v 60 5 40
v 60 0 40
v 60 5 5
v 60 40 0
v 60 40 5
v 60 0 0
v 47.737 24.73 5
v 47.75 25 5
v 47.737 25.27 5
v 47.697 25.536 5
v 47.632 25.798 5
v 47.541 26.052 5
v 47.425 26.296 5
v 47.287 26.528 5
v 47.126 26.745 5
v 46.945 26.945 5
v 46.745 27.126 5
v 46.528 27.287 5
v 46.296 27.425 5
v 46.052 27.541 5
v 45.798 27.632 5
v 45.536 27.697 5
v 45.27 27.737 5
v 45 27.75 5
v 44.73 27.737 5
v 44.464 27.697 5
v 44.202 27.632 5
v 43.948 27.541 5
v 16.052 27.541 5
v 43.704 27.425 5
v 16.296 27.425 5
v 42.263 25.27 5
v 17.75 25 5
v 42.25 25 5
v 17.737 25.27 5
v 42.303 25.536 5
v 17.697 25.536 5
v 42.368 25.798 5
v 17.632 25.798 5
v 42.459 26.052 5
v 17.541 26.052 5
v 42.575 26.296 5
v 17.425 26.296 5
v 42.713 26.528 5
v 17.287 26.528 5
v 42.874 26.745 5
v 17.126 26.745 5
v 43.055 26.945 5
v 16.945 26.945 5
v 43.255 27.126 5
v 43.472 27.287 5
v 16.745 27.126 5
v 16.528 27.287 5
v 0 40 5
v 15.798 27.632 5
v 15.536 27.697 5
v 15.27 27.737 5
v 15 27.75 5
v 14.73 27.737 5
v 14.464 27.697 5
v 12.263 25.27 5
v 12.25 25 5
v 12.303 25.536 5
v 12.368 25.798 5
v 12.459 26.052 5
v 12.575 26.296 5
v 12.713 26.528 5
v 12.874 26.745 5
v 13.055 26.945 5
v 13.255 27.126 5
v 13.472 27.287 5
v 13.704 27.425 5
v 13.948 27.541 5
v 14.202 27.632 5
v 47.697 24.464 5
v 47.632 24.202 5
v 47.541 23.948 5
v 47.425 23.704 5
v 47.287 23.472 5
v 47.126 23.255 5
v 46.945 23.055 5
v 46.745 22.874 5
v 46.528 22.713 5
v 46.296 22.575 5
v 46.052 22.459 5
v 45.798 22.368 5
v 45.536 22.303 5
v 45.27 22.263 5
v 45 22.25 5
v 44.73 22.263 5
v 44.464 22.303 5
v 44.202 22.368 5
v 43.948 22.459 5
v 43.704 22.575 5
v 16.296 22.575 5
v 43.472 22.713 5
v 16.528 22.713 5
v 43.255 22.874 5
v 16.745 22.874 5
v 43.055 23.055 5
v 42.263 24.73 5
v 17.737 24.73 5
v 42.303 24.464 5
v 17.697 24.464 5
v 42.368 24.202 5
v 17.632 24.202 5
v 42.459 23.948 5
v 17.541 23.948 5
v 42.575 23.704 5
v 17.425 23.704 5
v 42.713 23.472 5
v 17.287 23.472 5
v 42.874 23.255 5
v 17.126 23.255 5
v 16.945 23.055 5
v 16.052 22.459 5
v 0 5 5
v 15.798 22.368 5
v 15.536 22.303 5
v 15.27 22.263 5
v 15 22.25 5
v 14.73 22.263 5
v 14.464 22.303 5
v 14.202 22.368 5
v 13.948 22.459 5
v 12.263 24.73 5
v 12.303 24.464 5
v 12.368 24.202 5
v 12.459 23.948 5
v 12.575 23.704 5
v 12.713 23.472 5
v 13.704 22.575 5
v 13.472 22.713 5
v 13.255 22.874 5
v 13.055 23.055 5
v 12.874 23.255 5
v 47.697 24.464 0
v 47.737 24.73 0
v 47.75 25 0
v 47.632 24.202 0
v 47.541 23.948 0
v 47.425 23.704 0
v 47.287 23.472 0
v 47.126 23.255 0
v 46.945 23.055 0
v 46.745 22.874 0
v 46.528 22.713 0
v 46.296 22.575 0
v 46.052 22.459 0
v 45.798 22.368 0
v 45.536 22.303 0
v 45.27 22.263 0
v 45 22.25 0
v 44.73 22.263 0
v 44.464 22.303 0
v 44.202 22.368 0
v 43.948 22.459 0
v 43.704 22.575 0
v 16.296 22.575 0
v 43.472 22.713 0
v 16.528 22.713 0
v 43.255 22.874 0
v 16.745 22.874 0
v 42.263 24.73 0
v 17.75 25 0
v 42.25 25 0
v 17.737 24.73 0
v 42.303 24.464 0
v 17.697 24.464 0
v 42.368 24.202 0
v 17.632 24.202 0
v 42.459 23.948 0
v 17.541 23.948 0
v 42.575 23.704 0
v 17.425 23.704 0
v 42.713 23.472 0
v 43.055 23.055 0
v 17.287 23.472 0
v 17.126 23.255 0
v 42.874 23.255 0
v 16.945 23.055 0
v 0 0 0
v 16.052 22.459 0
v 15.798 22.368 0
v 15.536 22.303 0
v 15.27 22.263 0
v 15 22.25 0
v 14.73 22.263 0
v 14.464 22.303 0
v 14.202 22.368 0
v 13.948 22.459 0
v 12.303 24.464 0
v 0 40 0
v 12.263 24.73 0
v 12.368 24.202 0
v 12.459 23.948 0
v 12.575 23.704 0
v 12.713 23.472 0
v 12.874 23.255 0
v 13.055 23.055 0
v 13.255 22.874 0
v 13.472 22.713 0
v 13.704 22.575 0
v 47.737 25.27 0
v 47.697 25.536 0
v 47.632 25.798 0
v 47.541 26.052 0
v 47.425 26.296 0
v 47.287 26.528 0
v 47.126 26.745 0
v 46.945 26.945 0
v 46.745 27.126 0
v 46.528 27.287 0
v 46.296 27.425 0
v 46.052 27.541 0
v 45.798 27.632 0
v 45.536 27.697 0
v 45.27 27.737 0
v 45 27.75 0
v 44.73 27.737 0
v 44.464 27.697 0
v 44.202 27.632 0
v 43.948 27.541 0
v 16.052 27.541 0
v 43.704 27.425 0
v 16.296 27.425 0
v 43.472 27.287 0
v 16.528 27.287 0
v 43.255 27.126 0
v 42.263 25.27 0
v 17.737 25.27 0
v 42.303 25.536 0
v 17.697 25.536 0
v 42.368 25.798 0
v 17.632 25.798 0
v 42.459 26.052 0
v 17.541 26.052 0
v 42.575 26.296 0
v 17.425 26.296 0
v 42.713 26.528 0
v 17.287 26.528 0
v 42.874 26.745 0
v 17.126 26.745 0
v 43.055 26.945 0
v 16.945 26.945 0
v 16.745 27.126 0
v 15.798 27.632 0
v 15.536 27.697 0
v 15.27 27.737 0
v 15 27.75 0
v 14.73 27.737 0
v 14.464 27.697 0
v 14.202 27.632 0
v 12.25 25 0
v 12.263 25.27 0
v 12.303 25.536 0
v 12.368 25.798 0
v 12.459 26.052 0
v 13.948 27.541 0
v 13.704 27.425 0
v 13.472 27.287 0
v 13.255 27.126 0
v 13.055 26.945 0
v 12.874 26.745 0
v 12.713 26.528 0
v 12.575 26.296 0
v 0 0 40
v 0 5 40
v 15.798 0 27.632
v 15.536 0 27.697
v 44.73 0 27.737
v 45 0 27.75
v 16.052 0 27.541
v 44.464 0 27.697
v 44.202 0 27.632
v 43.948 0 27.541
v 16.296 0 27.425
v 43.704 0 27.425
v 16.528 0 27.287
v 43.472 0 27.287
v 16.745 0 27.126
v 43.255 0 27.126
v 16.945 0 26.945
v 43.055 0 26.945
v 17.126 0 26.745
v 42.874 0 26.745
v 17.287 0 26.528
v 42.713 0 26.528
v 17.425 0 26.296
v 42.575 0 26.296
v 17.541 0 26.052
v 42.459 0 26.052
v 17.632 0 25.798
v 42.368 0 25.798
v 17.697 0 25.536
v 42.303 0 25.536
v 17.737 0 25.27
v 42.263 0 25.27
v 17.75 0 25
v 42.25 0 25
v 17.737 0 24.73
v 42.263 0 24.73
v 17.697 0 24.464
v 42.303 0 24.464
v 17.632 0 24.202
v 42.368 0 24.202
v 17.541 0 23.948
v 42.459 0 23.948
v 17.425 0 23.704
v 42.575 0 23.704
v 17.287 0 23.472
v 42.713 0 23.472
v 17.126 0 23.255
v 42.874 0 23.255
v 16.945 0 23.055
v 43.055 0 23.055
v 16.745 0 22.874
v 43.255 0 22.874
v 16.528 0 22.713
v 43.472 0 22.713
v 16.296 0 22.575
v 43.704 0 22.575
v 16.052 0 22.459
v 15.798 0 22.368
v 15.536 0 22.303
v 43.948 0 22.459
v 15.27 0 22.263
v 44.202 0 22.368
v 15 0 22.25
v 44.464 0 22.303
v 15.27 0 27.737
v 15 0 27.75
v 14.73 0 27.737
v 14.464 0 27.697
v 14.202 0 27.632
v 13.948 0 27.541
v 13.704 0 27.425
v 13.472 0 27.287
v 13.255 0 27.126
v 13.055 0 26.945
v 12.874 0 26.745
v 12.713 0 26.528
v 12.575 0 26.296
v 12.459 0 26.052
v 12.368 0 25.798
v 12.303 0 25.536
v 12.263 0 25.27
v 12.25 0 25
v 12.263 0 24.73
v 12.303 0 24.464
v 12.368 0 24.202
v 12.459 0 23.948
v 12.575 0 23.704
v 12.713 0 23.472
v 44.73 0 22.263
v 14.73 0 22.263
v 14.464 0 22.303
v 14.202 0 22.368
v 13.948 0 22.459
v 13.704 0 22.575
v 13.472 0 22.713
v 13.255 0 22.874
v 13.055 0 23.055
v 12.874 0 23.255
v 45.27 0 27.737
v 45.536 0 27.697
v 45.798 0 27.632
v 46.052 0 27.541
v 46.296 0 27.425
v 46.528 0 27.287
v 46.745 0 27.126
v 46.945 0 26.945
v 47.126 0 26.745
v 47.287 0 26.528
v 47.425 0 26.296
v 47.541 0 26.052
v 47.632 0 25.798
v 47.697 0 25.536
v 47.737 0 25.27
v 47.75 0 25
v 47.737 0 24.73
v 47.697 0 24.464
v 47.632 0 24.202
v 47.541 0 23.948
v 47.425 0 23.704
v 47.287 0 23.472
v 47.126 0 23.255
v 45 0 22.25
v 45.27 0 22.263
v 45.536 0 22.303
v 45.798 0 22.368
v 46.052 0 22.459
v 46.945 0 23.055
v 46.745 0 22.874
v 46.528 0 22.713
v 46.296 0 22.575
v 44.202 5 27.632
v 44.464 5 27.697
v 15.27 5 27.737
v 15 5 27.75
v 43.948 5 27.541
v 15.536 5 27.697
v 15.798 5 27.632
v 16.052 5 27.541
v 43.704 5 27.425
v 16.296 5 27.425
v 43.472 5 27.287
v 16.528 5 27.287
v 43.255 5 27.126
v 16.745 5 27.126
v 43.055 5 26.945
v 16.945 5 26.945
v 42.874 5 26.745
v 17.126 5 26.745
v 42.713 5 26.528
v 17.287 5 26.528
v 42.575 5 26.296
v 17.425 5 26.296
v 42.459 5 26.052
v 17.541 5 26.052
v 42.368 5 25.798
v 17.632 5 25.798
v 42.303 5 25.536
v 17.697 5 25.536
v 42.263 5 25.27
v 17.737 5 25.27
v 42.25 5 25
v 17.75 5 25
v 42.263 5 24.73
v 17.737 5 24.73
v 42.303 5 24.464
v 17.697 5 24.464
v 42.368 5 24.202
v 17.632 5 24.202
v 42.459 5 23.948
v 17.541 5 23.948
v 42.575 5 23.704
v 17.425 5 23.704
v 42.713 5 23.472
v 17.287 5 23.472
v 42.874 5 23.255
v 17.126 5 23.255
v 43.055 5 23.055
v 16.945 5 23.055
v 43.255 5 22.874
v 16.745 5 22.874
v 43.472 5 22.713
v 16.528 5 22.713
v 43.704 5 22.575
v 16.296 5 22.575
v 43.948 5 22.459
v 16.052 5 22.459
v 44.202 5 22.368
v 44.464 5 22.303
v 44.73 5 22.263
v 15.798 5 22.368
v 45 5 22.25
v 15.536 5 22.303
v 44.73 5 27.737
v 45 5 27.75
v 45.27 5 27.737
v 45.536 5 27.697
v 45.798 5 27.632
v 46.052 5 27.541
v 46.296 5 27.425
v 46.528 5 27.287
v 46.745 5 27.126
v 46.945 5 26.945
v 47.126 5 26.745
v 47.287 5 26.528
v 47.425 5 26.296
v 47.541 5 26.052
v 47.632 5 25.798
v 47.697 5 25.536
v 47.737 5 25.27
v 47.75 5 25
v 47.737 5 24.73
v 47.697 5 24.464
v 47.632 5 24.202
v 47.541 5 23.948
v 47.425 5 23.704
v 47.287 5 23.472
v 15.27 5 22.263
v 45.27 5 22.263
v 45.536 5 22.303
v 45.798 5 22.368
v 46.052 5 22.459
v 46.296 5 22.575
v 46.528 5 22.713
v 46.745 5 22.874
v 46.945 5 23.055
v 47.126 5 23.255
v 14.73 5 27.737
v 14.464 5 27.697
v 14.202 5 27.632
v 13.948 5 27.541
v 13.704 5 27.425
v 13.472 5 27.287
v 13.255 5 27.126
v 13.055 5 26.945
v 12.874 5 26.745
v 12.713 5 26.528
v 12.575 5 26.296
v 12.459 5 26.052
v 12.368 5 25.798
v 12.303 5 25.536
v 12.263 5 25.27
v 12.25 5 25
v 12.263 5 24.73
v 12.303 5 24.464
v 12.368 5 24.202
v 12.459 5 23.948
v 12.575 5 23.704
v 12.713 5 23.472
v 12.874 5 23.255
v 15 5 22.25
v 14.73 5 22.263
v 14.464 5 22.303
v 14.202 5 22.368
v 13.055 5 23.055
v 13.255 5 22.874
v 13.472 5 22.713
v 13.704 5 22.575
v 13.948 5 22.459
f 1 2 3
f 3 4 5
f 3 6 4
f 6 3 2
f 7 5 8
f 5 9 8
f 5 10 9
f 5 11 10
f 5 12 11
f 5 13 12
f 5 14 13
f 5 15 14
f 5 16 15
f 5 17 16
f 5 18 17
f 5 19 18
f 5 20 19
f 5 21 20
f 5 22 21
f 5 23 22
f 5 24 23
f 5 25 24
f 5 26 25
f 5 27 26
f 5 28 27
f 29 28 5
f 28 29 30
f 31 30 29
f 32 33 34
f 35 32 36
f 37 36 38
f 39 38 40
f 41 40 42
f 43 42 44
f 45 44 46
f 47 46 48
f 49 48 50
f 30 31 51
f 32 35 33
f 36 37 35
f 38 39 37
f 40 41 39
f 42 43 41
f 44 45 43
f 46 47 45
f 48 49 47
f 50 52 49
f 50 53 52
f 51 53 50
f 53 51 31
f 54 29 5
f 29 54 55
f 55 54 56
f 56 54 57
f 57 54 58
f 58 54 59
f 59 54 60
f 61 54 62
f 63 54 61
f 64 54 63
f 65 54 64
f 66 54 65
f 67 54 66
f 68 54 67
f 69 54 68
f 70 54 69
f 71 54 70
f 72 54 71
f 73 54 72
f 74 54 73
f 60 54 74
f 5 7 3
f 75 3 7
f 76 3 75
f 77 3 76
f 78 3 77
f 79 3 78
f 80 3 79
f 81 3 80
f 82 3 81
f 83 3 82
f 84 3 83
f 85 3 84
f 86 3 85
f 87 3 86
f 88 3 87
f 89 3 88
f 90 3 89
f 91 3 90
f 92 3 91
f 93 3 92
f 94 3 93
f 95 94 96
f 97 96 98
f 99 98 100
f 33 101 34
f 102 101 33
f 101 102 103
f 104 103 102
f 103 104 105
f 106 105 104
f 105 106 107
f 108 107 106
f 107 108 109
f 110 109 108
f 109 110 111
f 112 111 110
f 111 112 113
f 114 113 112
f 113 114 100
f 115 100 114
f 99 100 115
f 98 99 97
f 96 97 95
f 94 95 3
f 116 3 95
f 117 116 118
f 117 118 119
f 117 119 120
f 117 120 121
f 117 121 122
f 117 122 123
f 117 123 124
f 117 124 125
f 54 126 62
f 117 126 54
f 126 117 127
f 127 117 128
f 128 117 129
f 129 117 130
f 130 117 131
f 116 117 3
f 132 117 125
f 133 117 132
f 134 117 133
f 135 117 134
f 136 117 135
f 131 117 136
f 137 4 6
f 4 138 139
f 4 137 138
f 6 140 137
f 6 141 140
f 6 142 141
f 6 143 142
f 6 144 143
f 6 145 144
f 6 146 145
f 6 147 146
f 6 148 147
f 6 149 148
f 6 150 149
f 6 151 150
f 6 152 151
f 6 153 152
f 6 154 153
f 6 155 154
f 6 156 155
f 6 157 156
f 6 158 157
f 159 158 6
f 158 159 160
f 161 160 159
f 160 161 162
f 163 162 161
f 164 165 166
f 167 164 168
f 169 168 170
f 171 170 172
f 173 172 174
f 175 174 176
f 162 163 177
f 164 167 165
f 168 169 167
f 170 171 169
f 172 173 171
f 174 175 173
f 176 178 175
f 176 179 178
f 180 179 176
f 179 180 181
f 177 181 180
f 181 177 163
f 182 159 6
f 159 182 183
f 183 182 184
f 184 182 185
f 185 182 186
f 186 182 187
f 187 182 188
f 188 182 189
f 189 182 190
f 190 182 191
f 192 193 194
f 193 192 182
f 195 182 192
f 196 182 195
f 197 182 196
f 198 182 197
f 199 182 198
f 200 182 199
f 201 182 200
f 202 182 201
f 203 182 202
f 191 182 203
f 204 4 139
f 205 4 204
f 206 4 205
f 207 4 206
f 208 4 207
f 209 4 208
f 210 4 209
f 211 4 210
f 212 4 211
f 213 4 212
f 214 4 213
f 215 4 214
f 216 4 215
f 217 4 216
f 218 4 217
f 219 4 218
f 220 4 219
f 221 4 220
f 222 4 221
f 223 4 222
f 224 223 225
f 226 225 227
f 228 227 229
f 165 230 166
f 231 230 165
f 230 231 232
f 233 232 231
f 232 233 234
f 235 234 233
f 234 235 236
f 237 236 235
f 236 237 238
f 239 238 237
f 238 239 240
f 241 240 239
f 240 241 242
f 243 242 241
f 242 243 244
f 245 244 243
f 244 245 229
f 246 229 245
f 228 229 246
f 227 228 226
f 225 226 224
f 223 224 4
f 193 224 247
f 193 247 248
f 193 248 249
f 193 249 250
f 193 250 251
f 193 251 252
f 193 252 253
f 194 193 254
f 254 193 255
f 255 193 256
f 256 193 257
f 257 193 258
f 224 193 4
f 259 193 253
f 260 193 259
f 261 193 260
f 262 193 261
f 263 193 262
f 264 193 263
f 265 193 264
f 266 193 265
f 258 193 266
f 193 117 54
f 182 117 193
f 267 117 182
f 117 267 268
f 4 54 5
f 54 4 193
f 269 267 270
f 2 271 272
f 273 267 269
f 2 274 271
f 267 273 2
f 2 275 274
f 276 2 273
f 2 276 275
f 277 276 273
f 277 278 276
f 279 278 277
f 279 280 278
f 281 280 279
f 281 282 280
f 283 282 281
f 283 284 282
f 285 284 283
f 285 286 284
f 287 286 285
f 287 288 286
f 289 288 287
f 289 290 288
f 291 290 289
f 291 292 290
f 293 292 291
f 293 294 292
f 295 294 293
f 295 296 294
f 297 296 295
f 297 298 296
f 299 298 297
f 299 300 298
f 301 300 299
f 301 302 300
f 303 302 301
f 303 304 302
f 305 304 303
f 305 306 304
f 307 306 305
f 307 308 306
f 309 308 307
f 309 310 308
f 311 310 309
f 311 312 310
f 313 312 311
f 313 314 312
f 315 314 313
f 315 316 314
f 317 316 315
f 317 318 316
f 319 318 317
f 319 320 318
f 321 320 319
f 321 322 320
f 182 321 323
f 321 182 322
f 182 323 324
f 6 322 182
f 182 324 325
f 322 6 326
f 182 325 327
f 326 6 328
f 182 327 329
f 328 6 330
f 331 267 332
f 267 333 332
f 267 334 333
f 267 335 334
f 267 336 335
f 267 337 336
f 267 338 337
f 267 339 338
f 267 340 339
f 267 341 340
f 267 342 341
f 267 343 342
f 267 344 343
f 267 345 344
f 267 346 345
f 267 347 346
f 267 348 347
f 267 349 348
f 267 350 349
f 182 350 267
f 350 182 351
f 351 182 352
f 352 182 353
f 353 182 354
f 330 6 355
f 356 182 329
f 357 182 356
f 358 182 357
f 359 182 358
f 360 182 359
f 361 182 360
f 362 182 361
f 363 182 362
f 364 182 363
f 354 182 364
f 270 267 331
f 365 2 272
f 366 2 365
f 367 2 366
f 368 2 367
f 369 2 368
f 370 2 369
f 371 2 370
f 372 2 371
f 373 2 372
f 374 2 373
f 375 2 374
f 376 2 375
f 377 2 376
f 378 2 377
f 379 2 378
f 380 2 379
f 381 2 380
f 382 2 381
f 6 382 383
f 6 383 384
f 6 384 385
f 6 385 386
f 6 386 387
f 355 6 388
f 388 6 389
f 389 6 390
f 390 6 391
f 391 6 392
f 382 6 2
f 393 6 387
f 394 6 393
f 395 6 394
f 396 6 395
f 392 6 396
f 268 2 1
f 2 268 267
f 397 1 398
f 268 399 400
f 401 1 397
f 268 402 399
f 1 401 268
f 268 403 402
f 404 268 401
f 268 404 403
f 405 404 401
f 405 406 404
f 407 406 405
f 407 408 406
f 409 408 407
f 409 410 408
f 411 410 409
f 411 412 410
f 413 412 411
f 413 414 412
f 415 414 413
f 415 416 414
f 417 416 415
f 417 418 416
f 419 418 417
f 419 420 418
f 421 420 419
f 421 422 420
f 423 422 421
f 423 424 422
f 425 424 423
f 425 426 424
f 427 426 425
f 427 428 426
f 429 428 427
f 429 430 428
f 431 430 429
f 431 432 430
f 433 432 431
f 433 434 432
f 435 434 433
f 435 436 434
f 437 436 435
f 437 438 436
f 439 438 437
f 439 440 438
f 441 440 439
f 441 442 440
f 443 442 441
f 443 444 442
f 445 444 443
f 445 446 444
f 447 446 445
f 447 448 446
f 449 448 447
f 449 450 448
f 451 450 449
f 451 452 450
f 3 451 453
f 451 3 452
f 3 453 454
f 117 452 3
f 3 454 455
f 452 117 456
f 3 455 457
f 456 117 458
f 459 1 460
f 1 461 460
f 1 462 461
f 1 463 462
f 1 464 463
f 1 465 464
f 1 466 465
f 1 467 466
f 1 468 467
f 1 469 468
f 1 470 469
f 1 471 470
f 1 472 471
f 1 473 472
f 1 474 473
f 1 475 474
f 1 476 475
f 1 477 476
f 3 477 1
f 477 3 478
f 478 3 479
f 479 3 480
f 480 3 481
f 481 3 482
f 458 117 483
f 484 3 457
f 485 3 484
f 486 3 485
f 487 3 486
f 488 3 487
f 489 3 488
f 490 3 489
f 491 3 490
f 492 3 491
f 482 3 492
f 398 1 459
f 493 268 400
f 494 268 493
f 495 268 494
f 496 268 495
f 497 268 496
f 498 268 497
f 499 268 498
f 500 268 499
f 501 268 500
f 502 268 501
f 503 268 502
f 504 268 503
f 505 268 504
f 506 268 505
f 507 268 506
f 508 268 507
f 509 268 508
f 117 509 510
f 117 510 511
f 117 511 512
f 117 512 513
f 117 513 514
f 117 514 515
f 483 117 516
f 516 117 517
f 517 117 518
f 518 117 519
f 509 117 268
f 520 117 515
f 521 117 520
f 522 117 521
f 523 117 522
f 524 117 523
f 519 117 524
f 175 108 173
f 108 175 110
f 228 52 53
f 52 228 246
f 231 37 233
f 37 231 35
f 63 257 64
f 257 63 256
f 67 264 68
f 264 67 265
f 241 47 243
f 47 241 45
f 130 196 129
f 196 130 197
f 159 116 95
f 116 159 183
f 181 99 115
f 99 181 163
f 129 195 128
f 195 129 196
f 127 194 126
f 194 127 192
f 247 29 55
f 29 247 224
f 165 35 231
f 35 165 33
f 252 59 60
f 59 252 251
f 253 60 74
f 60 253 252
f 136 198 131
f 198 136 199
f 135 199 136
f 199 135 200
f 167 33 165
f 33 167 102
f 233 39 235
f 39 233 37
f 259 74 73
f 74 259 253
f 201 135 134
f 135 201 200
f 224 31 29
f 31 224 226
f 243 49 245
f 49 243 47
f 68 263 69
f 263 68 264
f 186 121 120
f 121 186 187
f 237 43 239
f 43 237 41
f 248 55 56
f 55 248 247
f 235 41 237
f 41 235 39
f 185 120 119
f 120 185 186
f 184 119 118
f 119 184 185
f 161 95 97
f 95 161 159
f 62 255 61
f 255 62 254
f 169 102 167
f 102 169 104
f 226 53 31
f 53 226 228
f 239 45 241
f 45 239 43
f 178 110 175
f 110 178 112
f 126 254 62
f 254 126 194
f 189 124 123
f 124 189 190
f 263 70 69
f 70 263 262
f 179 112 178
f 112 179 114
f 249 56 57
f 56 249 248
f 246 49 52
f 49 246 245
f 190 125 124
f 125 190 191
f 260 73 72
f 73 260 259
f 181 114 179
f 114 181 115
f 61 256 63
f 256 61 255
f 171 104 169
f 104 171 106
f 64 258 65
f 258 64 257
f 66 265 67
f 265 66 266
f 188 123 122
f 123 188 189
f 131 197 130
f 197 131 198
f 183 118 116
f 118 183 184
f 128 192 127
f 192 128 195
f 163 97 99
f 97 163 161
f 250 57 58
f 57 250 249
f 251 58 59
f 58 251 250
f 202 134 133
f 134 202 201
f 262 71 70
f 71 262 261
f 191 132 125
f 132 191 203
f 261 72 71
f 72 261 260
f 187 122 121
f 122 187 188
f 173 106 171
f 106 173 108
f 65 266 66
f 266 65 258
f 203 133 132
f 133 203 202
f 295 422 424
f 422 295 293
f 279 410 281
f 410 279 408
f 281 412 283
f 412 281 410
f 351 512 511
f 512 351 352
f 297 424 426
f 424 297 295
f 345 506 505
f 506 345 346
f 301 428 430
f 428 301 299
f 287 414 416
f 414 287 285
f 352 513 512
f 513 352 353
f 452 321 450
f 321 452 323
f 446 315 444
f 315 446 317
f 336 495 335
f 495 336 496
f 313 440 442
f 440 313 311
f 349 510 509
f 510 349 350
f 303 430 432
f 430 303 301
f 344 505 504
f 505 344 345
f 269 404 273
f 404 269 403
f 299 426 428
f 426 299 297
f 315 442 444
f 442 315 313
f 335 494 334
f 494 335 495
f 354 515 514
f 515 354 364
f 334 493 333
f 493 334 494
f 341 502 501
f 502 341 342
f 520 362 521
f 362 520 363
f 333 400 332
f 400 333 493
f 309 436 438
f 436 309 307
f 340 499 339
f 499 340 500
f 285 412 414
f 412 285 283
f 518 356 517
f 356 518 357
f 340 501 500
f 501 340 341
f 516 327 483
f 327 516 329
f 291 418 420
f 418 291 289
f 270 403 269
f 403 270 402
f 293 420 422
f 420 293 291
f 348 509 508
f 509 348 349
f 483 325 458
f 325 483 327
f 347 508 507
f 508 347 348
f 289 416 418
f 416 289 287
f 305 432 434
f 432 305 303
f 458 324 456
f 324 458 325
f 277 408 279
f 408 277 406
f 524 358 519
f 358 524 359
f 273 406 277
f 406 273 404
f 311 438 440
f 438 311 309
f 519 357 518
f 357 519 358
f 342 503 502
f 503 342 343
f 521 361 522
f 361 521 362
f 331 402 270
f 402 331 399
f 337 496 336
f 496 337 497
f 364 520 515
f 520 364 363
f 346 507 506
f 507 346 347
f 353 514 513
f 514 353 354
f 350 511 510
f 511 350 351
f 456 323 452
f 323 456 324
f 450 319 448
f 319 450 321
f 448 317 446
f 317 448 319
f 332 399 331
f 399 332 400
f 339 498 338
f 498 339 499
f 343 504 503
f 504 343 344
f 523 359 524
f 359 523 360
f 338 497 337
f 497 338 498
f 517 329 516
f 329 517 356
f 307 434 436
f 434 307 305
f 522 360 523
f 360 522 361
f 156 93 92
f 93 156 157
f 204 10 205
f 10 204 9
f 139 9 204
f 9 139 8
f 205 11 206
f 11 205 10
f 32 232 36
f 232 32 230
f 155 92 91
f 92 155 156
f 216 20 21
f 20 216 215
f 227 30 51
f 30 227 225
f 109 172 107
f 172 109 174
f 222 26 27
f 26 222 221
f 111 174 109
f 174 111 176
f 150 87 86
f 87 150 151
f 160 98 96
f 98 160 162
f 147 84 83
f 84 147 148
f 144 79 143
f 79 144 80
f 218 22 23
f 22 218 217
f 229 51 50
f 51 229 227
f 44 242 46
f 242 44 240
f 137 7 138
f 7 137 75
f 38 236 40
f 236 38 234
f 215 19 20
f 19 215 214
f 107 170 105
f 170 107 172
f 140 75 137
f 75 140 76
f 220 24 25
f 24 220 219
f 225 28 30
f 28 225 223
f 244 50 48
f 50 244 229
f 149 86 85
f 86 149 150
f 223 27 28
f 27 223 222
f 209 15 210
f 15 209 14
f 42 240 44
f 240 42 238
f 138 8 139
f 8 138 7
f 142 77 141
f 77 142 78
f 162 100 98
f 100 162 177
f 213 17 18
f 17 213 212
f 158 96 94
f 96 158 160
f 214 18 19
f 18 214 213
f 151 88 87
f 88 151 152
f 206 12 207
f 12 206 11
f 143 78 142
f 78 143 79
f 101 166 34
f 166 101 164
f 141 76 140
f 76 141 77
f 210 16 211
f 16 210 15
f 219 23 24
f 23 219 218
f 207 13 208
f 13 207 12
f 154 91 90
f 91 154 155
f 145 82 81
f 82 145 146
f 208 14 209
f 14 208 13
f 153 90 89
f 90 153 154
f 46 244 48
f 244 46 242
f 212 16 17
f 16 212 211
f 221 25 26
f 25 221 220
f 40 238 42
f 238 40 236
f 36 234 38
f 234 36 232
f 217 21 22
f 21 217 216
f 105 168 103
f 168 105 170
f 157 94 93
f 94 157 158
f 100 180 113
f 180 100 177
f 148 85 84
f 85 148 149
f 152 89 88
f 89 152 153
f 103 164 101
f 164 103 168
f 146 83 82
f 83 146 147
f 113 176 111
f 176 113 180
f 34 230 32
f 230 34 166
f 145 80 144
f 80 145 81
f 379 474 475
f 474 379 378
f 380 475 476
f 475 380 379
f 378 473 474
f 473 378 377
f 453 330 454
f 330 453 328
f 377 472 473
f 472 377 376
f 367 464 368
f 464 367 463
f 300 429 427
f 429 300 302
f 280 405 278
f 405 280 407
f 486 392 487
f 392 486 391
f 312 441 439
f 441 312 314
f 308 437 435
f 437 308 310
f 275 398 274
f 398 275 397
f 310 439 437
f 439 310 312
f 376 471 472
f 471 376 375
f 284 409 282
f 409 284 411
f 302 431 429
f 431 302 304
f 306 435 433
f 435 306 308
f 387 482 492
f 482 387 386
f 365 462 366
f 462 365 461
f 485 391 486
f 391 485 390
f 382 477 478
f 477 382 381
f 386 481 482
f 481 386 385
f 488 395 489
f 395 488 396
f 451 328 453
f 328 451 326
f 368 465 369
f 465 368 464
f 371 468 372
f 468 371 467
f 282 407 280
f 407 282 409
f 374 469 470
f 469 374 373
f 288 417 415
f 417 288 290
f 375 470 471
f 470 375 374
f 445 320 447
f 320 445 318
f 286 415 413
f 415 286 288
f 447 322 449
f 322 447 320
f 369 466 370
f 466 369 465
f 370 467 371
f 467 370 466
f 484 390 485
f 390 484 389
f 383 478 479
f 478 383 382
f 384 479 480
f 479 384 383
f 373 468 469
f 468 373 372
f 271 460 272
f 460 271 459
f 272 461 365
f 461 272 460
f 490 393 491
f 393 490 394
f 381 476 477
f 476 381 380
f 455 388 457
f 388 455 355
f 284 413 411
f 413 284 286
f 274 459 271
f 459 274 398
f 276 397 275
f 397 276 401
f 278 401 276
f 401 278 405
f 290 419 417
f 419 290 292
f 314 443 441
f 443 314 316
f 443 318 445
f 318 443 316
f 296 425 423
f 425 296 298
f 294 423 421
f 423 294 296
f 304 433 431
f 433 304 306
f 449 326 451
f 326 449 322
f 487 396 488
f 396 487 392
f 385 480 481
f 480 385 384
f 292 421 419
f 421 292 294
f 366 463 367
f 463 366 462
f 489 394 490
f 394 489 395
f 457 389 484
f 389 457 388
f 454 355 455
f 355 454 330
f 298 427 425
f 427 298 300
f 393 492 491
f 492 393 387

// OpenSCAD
// L-shaped mounting bracket with two holes per flange.
len_x = 60;
depth_y = 40;
height_z = 40;
wall = 5;
hole_d = 5.5;

module bracket() {
    difference() {
        union() {
            cube([len_x, depth_y, wall]);      // horizontal flange
            cube([len_x, wall, height_z]);     // vertical flange
        }
        for (x = [15, 45]) {
            translate([x, 25, -1])
                cylinder(h = wall + 2, d = hole_d, $fn = 64);
            translate([x, wall + 1, 25])
                rotate([90, 0, 0])
                    cylinder(h = wall + 2, d = hole_d, $fn = 64);
        }
    }
}

bracket();
